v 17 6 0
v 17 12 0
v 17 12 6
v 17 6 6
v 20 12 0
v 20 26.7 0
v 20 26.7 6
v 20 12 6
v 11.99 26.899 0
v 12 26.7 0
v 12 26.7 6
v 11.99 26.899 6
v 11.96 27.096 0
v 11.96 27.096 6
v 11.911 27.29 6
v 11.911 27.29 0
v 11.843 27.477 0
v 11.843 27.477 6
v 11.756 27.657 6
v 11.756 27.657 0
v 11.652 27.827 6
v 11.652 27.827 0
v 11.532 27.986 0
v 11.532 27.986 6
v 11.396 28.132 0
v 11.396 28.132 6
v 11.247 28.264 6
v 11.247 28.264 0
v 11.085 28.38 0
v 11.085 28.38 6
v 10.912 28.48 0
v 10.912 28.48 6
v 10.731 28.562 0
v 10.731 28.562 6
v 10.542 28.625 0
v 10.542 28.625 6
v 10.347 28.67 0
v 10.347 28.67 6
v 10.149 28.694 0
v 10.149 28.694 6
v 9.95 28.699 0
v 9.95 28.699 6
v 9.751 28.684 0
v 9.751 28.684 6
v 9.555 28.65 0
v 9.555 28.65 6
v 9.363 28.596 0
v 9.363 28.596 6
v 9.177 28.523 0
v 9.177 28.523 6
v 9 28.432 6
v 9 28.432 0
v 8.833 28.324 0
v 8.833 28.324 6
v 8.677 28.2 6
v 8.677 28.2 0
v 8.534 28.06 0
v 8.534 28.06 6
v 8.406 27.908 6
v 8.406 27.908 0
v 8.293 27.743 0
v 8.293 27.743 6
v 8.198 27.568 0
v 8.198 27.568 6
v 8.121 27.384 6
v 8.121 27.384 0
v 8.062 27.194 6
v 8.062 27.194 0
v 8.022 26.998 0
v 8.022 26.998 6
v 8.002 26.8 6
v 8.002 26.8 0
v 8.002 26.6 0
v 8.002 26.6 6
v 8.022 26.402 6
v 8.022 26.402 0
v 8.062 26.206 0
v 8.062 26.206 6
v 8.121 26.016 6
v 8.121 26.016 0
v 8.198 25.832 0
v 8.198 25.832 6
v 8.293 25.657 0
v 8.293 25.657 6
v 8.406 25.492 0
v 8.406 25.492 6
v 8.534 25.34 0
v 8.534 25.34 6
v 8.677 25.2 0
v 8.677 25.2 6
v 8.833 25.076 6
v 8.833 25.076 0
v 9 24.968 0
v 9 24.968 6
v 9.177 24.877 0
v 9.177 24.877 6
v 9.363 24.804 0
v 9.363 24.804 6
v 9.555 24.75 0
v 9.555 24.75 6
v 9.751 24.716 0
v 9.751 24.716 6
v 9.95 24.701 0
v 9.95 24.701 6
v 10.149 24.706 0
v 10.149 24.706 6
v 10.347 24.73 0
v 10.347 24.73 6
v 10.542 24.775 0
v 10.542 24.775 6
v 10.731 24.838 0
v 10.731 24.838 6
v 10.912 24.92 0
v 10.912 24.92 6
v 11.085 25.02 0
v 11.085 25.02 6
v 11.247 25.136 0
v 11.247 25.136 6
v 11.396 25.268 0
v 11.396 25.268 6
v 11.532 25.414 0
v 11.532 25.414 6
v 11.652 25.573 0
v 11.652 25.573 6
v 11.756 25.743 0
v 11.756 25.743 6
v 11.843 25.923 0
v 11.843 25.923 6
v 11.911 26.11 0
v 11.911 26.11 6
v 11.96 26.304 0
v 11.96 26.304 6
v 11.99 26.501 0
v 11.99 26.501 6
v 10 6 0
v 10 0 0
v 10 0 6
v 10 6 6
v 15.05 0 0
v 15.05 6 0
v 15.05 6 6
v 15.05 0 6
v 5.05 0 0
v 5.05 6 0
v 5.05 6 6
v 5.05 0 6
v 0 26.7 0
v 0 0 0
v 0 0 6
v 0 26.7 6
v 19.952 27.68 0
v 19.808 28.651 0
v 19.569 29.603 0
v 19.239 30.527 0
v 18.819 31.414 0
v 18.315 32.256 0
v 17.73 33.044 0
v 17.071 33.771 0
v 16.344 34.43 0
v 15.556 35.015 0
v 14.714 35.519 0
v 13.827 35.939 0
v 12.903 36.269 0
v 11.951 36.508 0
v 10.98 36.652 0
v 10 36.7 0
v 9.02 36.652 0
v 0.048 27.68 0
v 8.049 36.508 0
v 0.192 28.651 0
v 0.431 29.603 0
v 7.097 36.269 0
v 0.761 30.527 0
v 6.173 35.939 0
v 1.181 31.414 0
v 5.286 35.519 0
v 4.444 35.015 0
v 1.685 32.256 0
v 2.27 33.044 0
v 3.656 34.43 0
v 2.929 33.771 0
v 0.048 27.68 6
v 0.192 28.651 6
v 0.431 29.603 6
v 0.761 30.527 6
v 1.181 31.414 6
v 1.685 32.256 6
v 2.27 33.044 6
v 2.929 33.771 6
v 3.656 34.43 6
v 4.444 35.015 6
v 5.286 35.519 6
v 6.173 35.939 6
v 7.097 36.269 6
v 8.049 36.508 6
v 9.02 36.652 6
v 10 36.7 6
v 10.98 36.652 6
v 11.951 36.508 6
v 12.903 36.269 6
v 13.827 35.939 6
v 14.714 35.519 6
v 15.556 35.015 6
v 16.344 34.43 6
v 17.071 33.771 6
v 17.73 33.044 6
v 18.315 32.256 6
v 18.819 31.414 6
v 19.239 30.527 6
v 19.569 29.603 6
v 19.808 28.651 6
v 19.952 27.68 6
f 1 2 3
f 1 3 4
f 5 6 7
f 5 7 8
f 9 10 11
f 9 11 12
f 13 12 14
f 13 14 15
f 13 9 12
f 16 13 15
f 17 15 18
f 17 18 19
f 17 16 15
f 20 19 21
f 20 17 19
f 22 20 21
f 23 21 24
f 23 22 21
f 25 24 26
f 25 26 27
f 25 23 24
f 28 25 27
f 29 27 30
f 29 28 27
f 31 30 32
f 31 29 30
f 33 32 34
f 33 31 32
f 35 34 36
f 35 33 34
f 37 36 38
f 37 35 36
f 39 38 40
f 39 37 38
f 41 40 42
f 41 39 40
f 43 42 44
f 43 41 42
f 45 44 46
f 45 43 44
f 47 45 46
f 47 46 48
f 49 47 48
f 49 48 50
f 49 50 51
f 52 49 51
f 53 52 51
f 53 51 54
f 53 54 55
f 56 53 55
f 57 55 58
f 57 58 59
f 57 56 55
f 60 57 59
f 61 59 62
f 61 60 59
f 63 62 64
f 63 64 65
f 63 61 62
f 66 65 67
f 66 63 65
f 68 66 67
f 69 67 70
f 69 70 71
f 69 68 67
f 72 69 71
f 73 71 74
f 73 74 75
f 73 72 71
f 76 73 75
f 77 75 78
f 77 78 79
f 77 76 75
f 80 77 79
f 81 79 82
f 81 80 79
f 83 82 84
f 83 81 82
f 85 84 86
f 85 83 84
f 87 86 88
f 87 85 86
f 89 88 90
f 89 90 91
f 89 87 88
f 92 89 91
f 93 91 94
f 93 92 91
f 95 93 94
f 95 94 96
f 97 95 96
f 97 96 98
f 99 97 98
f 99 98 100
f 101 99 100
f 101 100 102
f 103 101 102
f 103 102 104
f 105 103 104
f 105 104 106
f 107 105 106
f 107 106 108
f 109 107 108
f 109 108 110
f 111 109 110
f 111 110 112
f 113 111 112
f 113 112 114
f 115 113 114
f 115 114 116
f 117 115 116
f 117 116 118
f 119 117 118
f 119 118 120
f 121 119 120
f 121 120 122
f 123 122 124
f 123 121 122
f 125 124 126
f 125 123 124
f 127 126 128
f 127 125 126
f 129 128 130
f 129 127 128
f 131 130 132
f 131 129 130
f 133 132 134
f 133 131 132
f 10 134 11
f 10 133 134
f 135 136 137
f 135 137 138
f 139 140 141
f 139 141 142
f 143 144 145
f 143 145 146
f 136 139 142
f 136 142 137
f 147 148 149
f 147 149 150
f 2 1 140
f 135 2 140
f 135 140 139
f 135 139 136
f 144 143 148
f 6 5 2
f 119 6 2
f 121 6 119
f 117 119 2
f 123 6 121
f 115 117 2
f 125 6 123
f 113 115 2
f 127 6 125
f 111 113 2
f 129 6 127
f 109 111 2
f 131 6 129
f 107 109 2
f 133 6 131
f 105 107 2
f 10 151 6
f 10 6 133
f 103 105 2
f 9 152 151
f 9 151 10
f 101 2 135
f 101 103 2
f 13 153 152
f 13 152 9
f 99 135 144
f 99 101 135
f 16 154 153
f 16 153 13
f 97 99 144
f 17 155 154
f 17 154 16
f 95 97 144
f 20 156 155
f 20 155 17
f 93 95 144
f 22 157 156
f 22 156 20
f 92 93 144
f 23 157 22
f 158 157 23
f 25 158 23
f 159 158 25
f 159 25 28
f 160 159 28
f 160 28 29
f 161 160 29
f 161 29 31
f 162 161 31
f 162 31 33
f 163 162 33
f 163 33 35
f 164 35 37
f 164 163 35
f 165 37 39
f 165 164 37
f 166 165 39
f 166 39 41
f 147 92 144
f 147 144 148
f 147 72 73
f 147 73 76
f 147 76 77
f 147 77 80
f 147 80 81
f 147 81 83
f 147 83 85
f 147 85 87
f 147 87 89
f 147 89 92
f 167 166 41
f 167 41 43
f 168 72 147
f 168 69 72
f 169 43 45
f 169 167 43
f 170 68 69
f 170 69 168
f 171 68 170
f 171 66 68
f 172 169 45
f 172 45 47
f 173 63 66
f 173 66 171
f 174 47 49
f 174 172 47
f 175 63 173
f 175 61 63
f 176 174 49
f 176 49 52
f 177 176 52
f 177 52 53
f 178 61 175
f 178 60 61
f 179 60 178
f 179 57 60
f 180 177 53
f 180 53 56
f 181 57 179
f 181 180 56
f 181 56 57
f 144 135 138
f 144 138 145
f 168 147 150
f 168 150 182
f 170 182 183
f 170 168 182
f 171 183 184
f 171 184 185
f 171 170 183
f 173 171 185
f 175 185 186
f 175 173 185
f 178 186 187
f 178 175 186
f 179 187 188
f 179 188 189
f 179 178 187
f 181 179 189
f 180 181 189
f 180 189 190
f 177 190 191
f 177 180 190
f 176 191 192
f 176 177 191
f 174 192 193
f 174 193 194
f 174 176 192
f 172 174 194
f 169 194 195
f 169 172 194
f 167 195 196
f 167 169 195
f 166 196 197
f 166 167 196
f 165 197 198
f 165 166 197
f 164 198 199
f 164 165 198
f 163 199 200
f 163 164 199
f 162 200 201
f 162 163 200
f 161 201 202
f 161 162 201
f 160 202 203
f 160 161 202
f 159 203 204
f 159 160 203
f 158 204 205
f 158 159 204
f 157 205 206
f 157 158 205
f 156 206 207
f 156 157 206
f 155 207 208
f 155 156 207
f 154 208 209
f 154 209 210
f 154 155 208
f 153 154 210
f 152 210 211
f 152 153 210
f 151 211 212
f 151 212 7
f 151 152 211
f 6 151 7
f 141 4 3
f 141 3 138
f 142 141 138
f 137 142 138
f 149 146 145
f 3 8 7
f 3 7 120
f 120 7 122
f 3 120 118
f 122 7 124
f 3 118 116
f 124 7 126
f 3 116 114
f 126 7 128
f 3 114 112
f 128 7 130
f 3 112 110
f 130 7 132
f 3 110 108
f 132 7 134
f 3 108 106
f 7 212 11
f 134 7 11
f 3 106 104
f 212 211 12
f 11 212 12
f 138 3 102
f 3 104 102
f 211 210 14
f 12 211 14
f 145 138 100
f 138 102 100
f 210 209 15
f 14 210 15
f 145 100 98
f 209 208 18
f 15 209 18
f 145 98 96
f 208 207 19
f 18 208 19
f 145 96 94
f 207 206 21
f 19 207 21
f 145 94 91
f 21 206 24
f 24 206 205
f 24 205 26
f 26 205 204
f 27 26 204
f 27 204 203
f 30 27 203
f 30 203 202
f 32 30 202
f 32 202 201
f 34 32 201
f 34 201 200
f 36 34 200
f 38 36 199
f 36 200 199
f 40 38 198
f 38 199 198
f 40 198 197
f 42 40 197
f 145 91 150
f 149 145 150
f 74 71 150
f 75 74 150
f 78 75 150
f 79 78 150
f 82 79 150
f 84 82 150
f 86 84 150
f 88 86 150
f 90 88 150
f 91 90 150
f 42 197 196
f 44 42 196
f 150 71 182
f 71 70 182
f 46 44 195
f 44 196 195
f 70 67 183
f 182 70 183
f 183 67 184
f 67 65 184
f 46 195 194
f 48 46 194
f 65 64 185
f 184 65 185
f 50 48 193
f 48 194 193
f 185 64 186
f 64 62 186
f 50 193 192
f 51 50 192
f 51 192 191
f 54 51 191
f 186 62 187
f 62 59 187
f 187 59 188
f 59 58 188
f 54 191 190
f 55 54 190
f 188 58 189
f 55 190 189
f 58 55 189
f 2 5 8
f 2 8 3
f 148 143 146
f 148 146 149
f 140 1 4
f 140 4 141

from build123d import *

# Parameters (mm, degrees)
ESQUISSE1_R        = 2
BOSS_EXTRU_1_DEPTH = 6


with BuildPart() as part:
    # Esquisse1 → Boss.-Extru.1 (new body)
    with BuildSketch(Plane.XY):
        with BuildLine():
            Line((0, 0), (0, 26.7))
            ThreePointArc((0, 26.7), (10, 36.7), (20, 26.7))
            Line((20, 26.7), (20, 12))
            Line((20, 12), (17, 12))
            Line((17, 12), (17, 6))
            Line((17, 6), (15.05, 6))
            Line((15.05, 6), (15.05, 0))
            Line((15.05, 0), (10, 0))
            Line((10, 0), (10, 6))
            Line((10, 6), (5.05, 6))
            Line((5.05, 6), (5.05, 0))
            Line((5.05, 0), (0, 0))
        make_face()
        with Locations((10, 26.7)):
            Circle(ESQUISSE1_R, mode=Mode.SUBTRACT)
    extrude(amount=BOSS_EXTRU_1_DEPTH)


solid = part.part
